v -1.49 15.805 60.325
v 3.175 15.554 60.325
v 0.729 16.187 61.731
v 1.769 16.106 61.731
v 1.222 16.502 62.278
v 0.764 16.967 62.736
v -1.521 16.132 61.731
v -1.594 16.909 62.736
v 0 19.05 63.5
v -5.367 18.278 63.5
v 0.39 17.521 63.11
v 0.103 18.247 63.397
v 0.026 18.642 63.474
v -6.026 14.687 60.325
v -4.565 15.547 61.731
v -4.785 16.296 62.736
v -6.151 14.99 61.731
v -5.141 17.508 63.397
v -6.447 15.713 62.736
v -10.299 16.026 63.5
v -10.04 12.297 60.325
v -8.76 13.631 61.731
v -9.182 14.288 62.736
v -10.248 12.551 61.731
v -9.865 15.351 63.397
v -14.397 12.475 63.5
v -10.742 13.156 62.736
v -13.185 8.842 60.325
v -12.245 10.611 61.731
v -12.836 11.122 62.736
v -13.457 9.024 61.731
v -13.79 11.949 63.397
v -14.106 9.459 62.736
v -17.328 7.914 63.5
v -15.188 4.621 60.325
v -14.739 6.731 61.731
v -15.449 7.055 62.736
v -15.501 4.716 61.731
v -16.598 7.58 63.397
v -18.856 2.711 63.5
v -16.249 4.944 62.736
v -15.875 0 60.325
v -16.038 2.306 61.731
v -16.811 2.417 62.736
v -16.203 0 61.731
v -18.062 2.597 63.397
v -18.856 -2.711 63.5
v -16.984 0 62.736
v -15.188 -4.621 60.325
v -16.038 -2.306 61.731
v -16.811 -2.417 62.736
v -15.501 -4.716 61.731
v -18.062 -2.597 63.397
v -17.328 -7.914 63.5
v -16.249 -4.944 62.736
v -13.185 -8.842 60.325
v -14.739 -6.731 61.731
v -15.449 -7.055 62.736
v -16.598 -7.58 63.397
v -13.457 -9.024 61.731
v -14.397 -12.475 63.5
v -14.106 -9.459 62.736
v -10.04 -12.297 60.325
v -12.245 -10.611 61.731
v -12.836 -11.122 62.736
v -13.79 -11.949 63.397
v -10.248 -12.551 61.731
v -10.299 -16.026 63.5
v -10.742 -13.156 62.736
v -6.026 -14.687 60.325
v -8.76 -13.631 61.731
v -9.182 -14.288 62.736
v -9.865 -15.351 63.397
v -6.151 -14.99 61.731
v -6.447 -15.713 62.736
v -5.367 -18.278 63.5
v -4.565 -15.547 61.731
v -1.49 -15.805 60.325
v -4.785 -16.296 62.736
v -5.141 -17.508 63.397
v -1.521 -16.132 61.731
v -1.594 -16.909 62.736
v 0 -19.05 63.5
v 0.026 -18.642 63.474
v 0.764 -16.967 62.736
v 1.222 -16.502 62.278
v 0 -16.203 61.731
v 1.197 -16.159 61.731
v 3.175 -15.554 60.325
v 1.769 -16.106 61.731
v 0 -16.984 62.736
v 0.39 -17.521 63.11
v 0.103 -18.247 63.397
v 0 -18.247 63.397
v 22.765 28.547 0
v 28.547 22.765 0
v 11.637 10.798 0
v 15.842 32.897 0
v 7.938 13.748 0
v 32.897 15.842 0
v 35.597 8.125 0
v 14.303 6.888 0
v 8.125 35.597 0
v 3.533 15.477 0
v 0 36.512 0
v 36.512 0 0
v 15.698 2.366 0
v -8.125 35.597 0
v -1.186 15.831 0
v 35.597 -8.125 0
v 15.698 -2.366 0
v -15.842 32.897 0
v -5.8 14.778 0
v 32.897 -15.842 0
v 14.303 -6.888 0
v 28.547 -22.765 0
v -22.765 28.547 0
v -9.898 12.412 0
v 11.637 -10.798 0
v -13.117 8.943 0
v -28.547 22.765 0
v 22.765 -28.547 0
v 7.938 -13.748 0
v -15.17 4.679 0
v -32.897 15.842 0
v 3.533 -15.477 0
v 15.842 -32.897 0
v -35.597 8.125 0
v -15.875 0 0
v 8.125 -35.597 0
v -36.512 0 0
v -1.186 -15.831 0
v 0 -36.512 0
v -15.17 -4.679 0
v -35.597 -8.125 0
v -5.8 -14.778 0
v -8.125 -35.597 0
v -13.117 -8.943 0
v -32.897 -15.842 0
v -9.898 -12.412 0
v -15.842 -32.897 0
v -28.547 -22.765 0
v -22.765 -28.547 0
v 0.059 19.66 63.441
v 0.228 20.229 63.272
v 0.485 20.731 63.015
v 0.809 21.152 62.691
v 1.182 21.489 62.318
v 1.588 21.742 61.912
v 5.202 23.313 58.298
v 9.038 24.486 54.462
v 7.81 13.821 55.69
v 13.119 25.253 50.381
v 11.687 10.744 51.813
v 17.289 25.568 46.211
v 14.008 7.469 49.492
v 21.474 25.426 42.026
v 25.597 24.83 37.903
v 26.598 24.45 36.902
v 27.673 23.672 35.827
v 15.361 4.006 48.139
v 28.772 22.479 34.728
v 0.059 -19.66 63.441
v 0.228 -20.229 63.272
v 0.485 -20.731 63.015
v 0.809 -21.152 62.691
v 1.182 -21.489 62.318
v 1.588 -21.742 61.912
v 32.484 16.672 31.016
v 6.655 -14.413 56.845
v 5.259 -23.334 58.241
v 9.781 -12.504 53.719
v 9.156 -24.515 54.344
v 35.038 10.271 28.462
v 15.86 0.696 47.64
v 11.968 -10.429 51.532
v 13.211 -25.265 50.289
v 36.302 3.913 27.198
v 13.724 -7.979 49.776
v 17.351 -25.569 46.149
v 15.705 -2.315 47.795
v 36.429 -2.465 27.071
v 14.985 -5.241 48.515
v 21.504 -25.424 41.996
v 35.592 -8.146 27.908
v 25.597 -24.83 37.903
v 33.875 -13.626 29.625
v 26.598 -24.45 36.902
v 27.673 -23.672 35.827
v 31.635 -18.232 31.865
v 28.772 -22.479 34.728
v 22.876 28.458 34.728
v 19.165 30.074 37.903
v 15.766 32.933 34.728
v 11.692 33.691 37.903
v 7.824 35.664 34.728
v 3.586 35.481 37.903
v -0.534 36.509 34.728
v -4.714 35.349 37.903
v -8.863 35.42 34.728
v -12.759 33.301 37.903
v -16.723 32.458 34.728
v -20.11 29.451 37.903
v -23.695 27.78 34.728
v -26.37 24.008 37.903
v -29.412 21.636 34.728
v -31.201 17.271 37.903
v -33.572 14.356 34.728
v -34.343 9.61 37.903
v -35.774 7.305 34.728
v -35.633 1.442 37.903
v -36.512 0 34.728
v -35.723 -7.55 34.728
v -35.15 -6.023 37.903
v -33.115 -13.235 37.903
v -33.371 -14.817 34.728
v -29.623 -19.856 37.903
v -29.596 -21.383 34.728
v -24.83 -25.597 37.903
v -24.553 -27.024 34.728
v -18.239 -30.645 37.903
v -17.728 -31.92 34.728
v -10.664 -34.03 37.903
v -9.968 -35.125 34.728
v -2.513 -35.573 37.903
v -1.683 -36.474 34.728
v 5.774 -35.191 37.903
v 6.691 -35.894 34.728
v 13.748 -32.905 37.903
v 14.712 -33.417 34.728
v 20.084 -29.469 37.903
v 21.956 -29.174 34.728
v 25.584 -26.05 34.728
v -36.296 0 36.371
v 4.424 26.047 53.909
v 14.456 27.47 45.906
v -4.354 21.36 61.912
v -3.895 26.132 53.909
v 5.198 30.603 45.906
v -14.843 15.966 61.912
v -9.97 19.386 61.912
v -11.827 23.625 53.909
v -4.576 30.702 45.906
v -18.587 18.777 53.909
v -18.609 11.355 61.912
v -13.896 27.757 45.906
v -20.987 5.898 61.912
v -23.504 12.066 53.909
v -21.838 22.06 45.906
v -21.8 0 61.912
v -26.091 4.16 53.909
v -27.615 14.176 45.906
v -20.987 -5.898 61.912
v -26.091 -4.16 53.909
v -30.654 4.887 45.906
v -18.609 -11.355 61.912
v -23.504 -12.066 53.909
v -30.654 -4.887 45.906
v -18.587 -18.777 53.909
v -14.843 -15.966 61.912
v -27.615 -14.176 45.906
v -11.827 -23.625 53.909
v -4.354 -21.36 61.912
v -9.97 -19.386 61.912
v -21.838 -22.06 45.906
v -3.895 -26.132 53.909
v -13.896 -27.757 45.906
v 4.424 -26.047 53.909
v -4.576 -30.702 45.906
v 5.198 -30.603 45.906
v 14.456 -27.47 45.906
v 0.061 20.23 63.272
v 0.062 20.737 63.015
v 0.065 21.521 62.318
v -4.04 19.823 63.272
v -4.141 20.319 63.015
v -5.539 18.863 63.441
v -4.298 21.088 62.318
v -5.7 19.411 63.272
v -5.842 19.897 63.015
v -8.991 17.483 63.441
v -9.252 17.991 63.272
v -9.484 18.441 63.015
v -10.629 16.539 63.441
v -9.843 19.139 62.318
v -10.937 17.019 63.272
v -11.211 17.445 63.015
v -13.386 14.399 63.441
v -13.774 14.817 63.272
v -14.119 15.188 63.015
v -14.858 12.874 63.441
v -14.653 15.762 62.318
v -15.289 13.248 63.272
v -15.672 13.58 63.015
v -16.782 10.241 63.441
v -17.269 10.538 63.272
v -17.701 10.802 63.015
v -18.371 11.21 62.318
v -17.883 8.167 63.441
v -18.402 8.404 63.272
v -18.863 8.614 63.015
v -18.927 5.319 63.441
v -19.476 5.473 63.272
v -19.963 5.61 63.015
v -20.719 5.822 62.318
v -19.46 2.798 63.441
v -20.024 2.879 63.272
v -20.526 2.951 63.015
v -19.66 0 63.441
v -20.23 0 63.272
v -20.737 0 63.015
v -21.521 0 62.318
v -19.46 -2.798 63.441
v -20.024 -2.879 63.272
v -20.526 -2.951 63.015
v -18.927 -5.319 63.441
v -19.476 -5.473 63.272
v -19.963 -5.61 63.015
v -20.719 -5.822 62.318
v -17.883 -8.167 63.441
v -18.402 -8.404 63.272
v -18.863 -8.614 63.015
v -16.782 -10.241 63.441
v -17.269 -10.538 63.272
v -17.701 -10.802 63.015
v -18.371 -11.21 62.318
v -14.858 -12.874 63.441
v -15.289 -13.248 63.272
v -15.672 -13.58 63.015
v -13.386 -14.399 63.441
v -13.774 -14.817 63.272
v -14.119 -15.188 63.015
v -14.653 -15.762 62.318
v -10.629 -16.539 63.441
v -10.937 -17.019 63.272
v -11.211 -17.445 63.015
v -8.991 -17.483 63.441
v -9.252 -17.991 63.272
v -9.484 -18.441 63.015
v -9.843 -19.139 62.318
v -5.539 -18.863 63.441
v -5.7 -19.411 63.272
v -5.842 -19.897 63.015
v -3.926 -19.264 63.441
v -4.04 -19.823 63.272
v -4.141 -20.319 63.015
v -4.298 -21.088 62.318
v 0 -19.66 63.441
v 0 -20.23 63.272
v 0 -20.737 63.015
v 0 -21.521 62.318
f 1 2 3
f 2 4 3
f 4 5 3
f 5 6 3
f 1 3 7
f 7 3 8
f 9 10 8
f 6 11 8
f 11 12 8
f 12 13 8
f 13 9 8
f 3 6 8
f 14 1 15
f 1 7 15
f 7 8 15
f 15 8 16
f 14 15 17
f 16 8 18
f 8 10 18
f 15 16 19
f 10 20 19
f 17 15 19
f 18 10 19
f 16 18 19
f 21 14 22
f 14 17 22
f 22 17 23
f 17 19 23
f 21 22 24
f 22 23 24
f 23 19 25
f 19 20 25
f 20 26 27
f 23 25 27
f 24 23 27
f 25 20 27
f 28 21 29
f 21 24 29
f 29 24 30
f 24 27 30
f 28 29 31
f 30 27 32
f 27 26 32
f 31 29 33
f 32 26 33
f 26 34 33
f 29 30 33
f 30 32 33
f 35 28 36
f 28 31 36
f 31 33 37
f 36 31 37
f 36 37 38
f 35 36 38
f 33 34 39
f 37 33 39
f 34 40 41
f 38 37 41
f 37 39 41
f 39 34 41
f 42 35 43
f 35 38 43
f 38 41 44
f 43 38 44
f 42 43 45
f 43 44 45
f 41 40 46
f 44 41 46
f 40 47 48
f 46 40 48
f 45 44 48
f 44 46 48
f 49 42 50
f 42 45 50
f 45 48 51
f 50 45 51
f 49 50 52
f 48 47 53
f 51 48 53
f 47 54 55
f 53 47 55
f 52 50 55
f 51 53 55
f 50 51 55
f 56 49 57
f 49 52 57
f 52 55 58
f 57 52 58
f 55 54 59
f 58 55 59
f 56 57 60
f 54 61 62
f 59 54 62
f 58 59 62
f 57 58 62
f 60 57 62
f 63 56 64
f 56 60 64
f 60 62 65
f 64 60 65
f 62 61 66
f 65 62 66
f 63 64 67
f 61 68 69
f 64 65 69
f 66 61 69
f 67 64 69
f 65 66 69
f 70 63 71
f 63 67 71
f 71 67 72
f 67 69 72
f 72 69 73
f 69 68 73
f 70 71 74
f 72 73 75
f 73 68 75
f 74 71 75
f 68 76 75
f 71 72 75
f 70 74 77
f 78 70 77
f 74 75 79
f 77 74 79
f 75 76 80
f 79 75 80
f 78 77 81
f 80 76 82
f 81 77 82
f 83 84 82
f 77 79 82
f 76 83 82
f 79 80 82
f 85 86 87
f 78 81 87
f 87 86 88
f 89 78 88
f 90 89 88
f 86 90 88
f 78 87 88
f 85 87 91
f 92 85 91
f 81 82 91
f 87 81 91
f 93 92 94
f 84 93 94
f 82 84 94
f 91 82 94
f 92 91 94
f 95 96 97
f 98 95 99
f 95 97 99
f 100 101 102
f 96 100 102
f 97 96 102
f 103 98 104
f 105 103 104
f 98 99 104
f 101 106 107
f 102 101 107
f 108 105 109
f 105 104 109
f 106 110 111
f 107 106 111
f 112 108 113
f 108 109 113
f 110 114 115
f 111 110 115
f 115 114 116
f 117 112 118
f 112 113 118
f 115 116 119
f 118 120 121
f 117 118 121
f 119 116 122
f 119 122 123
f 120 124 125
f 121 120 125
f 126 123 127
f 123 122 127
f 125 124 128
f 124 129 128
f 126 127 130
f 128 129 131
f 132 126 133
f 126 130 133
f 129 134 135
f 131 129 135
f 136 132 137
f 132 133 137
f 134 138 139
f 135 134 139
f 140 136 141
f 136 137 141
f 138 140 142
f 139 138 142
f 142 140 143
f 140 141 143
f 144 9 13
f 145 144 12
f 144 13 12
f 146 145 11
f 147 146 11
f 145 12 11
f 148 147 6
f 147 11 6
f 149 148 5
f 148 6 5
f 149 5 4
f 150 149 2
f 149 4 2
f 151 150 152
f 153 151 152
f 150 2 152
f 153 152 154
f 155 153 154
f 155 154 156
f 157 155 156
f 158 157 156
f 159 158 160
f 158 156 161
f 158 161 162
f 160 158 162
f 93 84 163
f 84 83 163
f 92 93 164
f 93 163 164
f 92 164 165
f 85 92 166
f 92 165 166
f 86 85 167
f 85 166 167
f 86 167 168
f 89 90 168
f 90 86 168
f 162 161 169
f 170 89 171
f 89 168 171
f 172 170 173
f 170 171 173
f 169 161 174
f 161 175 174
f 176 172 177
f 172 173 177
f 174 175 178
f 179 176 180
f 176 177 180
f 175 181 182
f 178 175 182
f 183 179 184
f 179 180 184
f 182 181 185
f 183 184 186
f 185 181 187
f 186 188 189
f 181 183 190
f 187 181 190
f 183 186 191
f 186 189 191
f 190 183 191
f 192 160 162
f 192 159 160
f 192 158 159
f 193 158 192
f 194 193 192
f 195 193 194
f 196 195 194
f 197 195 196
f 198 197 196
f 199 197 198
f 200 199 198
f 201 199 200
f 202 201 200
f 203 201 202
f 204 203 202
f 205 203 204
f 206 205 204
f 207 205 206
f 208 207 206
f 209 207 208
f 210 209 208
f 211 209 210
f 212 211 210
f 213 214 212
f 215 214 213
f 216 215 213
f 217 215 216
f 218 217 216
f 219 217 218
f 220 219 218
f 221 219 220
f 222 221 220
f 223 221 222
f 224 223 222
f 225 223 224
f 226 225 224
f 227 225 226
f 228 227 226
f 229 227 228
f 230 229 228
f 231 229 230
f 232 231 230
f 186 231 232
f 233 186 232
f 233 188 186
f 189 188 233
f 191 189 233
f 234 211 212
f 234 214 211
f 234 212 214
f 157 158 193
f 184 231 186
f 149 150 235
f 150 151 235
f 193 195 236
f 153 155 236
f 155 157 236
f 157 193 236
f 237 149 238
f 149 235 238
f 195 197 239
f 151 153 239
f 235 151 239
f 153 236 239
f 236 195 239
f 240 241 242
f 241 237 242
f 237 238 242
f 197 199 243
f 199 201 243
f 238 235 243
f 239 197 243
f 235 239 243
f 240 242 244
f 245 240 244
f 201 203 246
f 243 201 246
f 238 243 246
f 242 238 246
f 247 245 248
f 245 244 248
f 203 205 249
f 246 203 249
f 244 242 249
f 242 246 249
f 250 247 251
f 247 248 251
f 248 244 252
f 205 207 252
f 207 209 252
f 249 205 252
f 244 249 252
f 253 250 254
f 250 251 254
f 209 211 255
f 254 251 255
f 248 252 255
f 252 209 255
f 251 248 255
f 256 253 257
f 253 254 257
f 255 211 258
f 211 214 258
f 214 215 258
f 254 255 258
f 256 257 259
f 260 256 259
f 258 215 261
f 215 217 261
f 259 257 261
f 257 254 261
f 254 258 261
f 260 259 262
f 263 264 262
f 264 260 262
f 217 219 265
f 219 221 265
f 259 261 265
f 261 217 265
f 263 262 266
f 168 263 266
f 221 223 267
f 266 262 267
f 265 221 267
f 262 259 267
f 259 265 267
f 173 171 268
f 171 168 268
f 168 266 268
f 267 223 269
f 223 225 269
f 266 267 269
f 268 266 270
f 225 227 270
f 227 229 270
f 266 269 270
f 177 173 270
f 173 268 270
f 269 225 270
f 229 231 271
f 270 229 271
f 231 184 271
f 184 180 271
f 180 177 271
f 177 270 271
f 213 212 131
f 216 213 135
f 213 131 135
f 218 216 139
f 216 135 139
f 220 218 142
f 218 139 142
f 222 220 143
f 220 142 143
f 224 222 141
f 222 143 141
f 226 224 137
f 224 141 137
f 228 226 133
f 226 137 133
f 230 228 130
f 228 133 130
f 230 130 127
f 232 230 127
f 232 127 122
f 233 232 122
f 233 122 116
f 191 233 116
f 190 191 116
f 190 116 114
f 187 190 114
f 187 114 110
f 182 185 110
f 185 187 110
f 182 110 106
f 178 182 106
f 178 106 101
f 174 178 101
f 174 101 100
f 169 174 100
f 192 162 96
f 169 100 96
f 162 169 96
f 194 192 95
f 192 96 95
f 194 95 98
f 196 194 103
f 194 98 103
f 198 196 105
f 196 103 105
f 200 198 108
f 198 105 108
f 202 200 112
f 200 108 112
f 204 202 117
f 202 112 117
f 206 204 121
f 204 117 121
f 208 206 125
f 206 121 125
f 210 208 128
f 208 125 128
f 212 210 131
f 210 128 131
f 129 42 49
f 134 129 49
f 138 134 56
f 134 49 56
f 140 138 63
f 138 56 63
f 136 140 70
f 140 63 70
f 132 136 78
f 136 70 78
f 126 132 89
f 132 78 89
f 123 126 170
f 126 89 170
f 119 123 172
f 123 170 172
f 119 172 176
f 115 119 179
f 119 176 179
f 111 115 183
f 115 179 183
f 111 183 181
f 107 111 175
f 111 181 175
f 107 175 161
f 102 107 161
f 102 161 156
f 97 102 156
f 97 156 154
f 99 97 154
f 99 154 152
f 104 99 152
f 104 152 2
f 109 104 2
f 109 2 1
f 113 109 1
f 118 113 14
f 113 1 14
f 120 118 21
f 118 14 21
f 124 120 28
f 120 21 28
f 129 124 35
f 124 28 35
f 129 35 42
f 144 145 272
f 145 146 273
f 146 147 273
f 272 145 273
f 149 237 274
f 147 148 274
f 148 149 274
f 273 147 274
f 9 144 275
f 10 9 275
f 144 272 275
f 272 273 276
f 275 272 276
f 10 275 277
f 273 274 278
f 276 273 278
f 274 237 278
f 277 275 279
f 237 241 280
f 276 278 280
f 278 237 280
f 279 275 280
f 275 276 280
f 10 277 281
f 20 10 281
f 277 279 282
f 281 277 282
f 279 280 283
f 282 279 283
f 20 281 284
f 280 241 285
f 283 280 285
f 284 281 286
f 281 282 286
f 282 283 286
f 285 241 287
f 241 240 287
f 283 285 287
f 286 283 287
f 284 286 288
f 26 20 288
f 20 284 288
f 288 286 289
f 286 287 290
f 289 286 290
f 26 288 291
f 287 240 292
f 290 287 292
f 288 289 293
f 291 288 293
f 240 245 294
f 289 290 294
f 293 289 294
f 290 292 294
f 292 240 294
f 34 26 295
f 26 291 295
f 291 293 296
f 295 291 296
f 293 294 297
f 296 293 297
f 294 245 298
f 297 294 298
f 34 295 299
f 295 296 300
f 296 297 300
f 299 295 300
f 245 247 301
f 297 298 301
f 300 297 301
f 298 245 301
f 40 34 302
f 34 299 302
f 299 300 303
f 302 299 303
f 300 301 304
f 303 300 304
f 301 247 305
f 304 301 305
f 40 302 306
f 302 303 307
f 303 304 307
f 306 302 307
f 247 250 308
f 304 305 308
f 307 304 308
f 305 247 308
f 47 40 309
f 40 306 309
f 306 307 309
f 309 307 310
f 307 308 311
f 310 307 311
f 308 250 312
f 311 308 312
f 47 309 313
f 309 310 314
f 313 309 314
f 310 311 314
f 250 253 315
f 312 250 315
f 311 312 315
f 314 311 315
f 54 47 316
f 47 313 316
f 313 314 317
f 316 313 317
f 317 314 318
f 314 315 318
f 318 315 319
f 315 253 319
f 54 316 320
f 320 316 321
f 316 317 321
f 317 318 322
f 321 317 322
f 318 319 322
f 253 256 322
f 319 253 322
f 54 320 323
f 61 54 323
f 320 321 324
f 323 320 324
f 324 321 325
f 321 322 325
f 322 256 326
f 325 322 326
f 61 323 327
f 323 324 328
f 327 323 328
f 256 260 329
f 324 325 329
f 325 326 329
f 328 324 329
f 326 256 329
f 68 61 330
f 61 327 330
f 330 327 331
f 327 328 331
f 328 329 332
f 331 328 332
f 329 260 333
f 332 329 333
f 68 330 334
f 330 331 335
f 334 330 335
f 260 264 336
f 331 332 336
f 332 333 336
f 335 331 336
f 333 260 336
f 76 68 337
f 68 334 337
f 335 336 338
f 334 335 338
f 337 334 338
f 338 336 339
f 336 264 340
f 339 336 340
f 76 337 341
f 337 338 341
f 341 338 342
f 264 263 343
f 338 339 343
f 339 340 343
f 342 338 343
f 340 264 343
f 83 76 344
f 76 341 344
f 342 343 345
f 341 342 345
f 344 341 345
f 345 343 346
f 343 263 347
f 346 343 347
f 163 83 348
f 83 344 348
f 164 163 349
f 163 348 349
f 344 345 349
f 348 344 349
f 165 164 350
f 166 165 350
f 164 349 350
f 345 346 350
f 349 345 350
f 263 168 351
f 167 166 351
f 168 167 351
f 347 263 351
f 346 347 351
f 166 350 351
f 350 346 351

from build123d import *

# Parameters (mm, degrees)
F2_R     = 6.35
F4_DEPTH = 127


with BuildPart() as f1:
    # F0 (on Front) → F1 (revolve)
    with BuildSketch(Plane.XZ):
        with BuildLine():
            ThreePointArc((-21.799631, 61.9125), (-19.87175, 57.258186), (-15.875, 60.325))
            ThreePointArc((-15.875, 60.325), (-16.804936, 62.570064), (-19.05, 63.5))
            ThreePointArc((-19.05, 63.5), (-20.6375, 63.074631), (-21.799631, 61.9125))
        make_face()
        with BuildLine():
            Line((-36.5125, 0), (-15.875, 0))
            Line((-15.875, 0), (-15.875, 60.325))
            ThreePointArc((-15.875, 60.325), (-19.87175, 57.258186), (-21.799631, 61.9125))
            Line((-21.799631, 61.9125), (-36.5125, 36.429063))
            Line((-36.5125, 36.429063), (-36.5125, 0))
        make_face()
    revolve(axis=Axis((0, 0, 26.929792), (0, 0, 1)))

    # F2
    f2_edges = [f1.edges().sort_by_distance(p)[0] for p in [
        (36.5125, 0, 36.429063),
    ]]
    fillet(f2_edges, radius=F2_R)

    # F3 (on Front) → F4 (cut, symmetric)
    with BuildSketch(Plane.XZ):
        Polygon((0, 88.9), (0, 63.5), (50.8, 12.7), (50.8, 88.9), align=None)
    extrude(amount=F4_DEPTH, both=True, mode=Mode.SUBTRACT)


solid = f1.part
